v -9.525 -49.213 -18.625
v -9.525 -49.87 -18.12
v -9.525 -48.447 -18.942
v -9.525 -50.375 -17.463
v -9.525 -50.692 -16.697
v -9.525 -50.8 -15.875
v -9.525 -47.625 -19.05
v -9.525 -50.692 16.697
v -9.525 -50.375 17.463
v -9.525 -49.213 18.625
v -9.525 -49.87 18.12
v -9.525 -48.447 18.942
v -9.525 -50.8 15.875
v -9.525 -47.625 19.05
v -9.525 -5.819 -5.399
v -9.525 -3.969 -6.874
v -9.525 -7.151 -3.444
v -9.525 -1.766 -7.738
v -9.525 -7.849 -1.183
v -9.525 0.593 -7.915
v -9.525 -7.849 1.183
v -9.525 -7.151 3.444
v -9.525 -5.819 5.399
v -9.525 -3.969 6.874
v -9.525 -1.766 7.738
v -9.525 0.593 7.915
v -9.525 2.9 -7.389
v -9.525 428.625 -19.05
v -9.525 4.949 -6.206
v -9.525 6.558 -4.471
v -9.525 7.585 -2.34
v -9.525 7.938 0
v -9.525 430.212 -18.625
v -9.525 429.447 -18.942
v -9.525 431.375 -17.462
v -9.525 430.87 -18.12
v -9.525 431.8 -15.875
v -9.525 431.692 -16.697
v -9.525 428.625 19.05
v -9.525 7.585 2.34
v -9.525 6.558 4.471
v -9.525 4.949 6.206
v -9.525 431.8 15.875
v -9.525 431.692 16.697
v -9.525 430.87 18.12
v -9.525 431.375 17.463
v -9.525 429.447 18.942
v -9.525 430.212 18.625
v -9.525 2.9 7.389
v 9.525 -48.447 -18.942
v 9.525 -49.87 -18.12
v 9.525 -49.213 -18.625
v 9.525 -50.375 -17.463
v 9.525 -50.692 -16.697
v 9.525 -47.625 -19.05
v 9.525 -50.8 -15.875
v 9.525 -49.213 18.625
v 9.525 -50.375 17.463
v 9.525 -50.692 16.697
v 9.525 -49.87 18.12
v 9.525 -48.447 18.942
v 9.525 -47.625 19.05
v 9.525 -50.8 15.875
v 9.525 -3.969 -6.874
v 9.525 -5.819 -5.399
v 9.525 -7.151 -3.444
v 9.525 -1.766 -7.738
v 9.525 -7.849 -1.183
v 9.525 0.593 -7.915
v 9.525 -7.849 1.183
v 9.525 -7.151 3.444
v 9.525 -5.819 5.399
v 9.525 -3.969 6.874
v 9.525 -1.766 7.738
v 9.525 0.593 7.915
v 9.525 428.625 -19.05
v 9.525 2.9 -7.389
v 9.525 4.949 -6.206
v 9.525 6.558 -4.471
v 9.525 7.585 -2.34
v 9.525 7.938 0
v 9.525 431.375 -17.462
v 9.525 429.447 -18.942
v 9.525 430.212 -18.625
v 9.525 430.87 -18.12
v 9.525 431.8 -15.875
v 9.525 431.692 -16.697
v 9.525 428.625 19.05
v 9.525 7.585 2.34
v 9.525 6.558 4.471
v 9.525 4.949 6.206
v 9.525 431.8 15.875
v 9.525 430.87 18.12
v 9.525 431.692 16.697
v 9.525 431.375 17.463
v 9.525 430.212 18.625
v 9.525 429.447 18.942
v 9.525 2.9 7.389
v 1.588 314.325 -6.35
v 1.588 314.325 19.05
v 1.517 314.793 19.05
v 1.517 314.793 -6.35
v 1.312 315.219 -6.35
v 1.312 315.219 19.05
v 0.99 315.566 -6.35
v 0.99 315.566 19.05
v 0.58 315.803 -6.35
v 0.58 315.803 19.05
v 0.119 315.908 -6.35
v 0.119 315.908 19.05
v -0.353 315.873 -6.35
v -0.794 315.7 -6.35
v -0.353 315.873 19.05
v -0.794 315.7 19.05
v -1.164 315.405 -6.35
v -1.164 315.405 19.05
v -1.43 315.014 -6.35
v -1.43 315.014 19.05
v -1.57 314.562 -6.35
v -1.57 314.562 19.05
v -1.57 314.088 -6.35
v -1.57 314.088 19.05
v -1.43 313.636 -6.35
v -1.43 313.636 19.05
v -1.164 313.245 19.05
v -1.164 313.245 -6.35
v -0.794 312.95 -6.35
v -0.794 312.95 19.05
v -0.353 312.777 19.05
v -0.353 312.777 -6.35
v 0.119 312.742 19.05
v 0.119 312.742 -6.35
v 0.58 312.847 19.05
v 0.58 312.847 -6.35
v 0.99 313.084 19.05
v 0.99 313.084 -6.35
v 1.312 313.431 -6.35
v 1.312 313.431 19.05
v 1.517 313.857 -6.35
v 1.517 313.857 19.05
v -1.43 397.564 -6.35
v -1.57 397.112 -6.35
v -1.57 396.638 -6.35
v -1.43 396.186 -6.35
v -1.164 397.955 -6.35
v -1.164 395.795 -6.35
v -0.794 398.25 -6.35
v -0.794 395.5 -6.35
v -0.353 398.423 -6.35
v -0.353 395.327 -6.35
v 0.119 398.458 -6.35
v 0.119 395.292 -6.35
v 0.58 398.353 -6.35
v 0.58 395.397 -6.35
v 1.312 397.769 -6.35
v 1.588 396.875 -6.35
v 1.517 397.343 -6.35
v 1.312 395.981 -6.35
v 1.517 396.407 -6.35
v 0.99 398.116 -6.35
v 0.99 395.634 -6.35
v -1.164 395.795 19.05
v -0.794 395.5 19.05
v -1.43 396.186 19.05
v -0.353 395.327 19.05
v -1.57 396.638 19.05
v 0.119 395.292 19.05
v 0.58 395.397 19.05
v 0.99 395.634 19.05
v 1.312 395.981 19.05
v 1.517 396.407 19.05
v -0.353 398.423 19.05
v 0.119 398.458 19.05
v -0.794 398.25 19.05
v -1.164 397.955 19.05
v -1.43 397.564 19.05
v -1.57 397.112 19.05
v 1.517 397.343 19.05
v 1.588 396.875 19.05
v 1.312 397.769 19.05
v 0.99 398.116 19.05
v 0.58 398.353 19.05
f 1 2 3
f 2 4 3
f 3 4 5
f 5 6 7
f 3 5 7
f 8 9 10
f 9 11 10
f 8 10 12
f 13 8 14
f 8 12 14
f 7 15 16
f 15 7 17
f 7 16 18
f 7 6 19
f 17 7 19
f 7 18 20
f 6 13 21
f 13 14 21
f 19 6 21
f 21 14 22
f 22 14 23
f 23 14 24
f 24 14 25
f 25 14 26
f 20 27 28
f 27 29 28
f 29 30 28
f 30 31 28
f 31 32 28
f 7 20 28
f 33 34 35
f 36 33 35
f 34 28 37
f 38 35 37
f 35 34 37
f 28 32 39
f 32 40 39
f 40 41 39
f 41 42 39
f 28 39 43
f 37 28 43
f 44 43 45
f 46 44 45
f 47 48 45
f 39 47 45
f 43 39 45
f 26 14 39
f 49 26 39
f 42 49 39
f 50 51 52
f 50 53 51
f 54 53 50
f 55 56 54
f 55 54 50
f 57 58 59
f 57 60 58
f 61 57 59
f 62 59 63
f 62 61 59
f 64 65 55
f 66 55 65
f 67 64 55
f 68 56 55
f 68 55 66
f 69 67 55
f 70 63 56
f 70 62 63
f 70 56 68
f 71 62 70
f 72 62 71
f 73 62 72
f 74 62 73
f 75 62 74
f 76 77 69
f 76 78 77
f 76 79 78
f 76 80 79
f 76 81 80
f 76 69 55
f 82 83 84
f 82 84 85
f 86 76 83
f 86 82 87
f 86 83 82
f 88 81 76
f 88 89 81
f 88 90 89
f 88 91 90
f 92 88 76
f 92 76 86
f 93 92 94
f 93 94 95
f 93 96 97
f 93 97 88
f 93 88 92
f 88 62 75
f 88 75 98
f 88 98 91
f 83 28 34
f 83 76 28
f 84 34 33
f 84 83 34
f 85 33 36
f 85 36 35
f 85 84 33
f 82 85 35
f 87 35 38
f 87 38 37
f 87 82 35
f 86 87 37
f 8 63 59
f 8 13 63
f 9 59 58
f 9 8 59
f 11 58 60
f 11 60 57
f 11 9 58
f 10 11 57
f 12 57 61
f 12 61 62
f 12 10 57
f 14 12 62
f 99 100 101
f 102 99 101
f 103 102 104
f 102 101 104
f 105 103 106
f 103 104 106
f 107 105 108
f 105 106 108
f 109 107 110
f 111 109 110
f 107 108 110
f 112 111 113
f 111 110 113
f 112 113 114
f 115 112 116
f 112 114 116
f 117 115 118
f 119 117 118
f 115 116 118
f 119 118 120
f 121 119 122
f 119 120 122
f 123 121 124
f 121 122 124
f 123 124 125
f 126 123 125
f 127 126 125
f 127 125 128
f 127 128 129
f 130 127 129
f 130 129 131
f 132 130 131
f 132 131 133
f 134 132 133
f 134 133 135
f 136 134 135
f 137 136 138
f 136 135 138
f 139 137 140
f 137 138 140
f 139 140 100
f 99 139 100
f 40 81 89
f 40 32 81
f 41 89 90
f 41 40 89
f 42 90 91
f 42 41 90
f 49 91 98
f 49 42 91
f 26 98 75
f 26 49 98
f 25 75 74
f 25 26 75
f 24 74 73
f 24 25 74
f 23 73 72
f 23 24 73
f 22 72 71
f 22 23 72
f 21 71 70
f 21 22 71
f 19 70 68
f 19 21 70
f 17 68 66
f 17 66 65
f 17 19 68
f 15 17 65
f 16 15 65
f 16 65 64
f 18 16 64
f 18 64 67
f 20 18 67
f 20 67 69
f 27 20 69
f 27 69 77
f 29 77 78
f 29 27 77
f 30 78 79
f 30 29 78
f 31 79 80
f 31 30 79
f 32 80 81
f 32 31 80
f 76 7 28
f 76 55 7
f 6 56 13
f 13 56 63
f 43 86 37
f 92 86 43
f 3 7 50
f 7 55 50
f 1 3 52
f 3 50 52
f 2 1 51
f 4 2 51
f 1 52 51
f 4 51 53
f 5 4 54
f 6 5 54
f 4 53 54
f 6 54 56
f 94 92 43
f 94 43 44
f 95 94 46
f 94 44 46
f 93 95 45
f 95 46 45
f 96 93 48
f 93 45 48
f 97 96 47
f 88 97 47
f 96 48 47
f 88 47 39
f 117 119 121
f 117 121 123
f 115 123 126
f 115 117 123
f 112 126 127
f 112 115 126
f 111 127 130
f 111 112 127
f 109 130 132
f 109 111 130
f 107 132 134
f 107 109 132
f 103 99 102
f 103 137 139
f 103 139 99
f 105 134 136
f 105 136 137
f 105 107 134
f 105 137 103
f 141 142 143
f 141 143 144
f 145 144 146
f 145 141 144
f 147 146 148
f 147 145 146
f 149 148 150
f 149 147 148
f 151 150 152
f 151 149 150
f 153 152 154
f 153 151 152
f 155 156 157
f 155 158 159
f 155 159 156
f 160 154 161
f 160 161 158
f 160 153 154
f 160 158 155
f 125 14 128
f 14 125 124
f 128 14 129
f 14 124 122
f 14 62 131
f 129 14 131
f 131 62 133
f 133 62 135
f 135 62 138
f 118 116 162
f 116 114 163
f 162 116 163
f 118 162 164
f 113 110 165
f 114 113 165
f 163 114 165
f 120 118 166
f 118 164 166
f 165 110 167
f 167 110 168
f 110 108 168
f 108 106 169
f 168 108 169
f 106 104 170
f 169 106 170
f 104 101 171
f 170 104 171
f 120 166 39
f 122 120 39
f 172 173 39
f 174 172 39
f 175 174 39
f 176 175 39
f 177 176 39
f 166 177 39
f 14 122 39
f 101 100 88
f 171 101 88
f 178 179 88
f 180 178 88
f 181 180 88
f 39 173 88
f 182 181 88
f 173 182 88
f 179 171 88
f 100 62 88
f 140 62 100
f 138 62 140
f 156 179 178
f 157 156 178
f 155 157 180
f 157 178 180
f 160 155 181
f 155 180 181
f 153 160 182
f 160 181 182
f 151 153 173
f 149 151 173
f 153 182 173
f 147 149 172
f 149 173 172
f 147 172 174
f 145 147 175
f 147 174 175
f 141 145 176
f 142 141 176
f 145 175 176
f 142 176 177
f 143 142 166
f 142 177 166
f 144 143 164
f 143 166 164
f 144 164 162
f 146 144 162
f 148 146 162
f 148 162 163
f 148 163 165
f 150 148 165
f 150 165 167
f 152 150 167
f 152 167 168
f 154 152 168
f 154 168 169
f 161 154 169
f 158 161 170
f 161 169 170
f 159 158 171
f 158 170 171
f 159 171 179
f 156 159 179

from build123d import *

# Parameters (mm, degrees)
F0_W     = 482.6
F0_H     = 38.1
F0_R     = 7.9375
F1_DEPTH = 9.525
F2_R     = 1.5875
F3_DEPTH = 25.4
F4_R     = 3.175
F5_R     = 3.175


with BuildPart() as f1:
    # F0 (on Right) → F1 (new body, symmetric)
    with BuildSketch(Plane.YZ):
        with Locations((190.5, 0)):
            Rectangle(F0_W, F0_H)
        Circle(F0_R, mode=Mode.SUBTRACT)
    extrude(amount=F1_DEPTH, both=True)

    # F2 (on face) → F3 (cut)
    with BuildSketch(Plane.XY.offset(19.05)):
        with Locations((0, 396.875)):
            Circle(F2_R)
        with Locations((0, 314.325)):
            Circle(F2_R)
    extrude(amount=-F3_DEPTH, mode=Mode.SUBTRACT)

    # F4
    f4_edges = [f1.edges().sort_by_distance(p)[0] for p in [
        (0, 431.8, -19.05),
    ]]
    fillet(f4_edges, radius=F4_R)

    # F5
    f5_edges = [f1.edges().sort_by_distance(p)[0] for p in [
        (0, 431.8, 19.05),
        (0, -50.8, -19.05),
        (0, -50.8, 19.05),
    ]]
    fillet(f5_edges, radius=F5_R)


solid = f1.part
